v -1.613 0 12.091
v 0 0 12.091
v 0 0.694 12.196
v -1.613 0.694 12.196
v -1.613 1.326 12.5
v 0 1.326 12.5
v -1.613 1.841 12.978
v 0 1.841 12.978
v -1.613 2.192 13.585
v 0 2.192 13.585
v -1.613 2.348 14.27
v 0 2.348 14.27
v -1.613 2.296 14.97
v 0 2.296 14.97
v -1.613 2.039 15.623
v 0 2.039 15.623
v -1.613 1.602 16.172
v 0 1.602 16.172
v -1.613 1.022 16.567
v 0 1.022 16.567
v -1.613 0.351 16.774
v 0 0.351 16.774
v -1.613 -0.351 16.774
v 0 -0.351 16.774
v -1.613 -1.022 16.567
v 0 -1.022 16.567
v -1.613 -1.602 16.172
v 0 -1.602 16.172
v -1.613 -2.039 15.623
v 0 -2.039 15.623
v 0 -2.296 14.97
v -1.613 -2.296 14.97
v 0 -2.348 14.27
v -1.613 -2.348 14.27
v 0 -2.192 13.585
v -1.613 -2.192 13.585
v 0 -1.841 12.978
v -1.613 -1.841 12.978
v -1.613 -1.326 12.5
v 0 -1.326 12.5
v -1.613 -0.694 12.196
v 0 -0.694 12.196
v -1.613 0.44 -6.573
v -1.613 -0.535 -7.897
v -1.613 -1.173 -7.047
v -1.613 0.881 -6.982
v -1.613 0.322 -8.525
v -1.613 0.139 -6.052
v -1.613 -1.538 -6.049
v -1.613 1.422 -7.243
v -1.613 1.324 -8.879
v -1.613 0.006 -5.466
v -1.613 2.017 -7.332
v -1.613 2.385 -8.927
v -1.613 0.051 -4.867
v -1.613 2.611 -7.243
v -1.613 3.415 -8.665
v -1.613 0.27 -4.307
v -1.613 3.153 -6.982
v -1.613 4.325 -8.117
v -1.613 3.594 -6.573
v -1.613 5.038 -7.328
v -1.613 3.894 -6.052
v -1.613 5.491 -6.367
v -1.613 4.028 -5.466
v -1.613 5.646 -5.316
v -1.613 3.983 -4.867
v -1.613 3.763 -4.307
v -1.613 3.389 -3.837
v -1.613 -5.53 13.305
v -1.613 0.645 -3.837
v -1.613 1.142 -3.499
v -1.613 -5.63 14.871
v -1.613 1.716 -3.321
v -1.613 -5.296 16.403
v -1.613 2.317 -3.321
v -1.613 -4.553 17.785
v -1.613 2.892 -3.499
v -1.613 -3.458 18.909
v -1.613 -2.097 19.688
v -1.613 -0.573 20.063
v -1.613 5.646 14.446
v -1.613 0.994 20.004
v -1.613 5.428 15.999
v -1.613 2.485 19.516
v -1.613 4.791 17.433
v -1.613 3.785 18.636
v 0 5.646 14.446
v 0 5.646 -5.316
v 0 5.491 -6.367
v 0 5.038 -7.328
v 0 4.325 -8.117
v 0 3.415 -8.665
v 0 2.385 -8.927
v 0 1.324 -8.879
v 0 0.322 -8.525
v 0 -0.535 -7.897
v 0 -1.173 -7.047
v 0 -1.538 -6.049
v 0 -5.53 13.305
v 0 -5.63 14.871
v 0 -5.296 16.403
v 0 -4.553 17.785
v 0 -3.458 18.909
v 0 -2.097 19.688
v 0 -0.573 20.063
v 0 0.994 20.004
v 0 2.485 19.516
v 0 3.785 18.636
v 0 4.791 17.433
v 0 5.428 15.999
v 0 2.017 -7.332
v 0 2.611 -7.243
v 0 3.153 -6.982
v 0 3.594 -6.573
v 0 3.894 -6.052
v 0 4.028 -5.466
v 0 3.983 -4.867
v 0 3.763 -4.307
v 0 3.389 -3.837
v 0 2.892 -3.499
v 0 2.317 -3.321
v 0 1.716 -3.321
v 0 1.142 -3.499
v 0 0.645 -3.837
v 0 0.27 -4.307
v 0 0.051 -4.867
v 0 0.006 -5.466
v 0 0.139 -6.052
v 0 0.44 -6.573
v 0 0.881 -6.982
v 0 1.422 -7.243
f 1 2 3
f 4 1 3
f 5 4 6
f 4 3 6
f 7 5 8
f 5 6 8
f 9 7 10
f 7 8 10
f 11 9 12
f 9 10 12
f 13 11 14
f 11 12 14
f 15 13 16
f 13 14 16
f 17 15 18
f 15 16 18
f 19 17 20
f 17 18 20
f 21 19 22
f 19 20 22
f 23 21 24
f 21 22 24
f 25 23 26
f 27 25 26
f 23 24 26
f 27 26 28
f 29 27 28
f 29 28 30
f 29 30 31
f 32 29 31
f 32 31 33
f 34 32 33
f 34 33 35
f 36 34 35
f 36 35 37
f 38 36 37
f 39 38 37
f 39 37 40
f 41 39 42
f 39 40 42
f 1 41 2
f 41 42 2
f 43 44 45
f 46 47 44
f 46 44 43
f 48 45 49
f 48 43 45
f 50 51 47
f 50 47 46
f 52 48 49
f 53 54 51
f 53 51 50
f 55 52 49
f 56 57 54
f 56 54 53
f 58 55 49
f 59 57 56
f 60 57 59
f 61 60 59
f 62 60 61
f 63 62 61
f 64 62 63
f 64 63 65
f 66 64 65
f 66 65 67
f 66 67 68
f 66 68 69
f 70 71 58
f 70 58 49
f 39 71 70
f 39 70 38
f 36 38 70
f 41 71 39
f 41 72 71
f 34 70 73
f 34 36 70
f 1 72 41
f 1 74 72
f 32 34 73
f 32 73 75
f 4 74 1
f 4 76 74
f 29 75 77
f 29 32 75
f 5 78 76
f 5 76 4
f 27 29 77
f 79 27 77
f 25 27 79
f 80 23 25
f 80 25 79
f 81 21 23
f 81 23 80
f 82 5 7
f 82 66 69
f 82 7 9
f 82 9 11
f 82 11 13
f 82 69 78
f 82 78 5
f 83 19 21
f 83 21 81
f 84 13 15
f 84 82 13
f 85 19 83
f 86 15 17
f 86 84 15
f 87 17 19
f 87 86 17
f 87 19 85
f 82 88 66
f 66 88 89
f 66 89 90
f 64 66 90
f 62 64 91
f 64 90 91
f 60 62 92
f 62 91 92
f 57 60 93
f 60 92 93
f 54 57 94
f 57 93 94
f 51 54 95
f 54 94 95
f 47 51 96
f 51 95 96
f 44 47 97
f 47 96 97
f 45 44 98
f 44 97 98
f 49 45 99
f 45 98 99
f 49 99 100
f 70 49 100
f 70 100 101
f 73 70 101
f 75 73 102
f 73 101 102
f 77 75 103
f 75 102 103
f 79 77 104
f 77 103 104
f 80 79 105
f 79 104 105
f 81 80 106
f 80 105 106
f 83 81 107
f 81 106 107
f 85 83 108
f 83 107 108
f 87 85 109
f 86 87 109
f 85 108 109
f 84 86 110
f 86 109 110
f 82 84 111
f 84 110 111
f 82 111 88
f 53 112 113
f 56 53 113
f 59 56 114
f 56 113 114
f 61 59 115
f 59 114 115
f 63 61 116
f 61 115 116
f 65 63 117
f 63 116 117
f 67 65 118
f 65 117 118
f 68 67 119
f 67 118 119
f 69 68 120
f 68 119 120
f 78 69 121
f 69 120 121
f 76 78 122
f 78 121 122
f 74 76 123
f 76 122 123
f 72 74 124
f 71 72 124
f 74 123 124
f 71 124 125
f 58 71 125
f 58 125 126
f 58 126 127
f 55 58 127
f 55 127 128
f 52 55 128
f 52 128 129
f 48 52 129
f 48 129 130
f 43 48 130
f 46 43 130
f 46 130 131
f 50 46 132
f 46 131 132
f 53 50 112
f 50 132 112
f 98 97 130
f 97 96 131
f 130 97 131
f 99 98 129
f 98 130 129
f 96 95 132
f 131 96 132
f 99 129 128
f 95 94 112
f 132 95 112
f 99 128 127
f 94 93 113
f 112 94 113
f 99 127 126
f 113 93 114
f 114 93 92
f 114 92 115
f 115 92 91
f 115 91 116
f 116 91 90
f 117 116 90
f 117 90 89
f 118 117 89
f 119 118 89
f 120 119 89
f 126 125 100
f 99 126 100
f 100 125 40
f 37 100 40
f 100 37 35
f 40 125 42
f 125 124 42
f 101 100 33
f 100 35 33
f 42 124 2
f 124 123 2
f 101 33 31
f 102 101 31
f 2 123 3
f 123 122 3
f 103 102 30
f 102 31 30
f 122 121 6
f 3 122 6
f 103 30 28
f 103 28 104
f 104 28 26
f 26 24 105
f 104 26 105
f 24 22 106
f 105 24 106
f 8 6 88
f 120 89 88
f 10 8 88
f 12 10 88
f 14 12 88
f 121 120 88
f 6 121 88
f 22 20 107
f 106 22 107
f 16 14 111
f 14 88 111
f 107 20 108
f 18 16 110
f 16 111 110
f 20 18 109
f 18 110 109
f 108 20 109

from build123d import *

# Parameters (mm, degrees)
SKETCH1_R           = 2.35458
SKETCH1_R_2         = 2.01676
BOSS_EXTRUDE1_DEPTH = 1.6129


with BuildPart() as part:
    # Sketch1 → Boss-Extrude1 (new body)
    with BuildSketch(Plane(origin=(0, 0, 0), x_dir=(0, 0, -1), z_dir=(1, 0, 0))):
        with BuildLine():
            Line((-14.445578284, 5.64642), (5.315621716, 5.64642))
            ThreePointArc((5.315621716, 5.64642), (8.926525669, 2.385276419), (6.048845981, -1.538069657))
            Line((6.048845981, -1.538069657), (-13.304950193, -5.530011426))
            ThreePointArc((-13.304950193, -5.530011426), (-20.062820754, -0.573276417), (-14.445578284, 5.64642))
        make_face()
        with Locations((-14.445578284, 0)):
            Circle(SKETCH1_R, mode=Mode.SUBTRACT)
        with Locations((5.315621716, 2.01676)):
            Circle(SKETCH1_R_2, mode=Mode.SUBTRACT)
    extrude(amount=-BOSS_EXTRUDE1_DEPTH)


solid = part.part
